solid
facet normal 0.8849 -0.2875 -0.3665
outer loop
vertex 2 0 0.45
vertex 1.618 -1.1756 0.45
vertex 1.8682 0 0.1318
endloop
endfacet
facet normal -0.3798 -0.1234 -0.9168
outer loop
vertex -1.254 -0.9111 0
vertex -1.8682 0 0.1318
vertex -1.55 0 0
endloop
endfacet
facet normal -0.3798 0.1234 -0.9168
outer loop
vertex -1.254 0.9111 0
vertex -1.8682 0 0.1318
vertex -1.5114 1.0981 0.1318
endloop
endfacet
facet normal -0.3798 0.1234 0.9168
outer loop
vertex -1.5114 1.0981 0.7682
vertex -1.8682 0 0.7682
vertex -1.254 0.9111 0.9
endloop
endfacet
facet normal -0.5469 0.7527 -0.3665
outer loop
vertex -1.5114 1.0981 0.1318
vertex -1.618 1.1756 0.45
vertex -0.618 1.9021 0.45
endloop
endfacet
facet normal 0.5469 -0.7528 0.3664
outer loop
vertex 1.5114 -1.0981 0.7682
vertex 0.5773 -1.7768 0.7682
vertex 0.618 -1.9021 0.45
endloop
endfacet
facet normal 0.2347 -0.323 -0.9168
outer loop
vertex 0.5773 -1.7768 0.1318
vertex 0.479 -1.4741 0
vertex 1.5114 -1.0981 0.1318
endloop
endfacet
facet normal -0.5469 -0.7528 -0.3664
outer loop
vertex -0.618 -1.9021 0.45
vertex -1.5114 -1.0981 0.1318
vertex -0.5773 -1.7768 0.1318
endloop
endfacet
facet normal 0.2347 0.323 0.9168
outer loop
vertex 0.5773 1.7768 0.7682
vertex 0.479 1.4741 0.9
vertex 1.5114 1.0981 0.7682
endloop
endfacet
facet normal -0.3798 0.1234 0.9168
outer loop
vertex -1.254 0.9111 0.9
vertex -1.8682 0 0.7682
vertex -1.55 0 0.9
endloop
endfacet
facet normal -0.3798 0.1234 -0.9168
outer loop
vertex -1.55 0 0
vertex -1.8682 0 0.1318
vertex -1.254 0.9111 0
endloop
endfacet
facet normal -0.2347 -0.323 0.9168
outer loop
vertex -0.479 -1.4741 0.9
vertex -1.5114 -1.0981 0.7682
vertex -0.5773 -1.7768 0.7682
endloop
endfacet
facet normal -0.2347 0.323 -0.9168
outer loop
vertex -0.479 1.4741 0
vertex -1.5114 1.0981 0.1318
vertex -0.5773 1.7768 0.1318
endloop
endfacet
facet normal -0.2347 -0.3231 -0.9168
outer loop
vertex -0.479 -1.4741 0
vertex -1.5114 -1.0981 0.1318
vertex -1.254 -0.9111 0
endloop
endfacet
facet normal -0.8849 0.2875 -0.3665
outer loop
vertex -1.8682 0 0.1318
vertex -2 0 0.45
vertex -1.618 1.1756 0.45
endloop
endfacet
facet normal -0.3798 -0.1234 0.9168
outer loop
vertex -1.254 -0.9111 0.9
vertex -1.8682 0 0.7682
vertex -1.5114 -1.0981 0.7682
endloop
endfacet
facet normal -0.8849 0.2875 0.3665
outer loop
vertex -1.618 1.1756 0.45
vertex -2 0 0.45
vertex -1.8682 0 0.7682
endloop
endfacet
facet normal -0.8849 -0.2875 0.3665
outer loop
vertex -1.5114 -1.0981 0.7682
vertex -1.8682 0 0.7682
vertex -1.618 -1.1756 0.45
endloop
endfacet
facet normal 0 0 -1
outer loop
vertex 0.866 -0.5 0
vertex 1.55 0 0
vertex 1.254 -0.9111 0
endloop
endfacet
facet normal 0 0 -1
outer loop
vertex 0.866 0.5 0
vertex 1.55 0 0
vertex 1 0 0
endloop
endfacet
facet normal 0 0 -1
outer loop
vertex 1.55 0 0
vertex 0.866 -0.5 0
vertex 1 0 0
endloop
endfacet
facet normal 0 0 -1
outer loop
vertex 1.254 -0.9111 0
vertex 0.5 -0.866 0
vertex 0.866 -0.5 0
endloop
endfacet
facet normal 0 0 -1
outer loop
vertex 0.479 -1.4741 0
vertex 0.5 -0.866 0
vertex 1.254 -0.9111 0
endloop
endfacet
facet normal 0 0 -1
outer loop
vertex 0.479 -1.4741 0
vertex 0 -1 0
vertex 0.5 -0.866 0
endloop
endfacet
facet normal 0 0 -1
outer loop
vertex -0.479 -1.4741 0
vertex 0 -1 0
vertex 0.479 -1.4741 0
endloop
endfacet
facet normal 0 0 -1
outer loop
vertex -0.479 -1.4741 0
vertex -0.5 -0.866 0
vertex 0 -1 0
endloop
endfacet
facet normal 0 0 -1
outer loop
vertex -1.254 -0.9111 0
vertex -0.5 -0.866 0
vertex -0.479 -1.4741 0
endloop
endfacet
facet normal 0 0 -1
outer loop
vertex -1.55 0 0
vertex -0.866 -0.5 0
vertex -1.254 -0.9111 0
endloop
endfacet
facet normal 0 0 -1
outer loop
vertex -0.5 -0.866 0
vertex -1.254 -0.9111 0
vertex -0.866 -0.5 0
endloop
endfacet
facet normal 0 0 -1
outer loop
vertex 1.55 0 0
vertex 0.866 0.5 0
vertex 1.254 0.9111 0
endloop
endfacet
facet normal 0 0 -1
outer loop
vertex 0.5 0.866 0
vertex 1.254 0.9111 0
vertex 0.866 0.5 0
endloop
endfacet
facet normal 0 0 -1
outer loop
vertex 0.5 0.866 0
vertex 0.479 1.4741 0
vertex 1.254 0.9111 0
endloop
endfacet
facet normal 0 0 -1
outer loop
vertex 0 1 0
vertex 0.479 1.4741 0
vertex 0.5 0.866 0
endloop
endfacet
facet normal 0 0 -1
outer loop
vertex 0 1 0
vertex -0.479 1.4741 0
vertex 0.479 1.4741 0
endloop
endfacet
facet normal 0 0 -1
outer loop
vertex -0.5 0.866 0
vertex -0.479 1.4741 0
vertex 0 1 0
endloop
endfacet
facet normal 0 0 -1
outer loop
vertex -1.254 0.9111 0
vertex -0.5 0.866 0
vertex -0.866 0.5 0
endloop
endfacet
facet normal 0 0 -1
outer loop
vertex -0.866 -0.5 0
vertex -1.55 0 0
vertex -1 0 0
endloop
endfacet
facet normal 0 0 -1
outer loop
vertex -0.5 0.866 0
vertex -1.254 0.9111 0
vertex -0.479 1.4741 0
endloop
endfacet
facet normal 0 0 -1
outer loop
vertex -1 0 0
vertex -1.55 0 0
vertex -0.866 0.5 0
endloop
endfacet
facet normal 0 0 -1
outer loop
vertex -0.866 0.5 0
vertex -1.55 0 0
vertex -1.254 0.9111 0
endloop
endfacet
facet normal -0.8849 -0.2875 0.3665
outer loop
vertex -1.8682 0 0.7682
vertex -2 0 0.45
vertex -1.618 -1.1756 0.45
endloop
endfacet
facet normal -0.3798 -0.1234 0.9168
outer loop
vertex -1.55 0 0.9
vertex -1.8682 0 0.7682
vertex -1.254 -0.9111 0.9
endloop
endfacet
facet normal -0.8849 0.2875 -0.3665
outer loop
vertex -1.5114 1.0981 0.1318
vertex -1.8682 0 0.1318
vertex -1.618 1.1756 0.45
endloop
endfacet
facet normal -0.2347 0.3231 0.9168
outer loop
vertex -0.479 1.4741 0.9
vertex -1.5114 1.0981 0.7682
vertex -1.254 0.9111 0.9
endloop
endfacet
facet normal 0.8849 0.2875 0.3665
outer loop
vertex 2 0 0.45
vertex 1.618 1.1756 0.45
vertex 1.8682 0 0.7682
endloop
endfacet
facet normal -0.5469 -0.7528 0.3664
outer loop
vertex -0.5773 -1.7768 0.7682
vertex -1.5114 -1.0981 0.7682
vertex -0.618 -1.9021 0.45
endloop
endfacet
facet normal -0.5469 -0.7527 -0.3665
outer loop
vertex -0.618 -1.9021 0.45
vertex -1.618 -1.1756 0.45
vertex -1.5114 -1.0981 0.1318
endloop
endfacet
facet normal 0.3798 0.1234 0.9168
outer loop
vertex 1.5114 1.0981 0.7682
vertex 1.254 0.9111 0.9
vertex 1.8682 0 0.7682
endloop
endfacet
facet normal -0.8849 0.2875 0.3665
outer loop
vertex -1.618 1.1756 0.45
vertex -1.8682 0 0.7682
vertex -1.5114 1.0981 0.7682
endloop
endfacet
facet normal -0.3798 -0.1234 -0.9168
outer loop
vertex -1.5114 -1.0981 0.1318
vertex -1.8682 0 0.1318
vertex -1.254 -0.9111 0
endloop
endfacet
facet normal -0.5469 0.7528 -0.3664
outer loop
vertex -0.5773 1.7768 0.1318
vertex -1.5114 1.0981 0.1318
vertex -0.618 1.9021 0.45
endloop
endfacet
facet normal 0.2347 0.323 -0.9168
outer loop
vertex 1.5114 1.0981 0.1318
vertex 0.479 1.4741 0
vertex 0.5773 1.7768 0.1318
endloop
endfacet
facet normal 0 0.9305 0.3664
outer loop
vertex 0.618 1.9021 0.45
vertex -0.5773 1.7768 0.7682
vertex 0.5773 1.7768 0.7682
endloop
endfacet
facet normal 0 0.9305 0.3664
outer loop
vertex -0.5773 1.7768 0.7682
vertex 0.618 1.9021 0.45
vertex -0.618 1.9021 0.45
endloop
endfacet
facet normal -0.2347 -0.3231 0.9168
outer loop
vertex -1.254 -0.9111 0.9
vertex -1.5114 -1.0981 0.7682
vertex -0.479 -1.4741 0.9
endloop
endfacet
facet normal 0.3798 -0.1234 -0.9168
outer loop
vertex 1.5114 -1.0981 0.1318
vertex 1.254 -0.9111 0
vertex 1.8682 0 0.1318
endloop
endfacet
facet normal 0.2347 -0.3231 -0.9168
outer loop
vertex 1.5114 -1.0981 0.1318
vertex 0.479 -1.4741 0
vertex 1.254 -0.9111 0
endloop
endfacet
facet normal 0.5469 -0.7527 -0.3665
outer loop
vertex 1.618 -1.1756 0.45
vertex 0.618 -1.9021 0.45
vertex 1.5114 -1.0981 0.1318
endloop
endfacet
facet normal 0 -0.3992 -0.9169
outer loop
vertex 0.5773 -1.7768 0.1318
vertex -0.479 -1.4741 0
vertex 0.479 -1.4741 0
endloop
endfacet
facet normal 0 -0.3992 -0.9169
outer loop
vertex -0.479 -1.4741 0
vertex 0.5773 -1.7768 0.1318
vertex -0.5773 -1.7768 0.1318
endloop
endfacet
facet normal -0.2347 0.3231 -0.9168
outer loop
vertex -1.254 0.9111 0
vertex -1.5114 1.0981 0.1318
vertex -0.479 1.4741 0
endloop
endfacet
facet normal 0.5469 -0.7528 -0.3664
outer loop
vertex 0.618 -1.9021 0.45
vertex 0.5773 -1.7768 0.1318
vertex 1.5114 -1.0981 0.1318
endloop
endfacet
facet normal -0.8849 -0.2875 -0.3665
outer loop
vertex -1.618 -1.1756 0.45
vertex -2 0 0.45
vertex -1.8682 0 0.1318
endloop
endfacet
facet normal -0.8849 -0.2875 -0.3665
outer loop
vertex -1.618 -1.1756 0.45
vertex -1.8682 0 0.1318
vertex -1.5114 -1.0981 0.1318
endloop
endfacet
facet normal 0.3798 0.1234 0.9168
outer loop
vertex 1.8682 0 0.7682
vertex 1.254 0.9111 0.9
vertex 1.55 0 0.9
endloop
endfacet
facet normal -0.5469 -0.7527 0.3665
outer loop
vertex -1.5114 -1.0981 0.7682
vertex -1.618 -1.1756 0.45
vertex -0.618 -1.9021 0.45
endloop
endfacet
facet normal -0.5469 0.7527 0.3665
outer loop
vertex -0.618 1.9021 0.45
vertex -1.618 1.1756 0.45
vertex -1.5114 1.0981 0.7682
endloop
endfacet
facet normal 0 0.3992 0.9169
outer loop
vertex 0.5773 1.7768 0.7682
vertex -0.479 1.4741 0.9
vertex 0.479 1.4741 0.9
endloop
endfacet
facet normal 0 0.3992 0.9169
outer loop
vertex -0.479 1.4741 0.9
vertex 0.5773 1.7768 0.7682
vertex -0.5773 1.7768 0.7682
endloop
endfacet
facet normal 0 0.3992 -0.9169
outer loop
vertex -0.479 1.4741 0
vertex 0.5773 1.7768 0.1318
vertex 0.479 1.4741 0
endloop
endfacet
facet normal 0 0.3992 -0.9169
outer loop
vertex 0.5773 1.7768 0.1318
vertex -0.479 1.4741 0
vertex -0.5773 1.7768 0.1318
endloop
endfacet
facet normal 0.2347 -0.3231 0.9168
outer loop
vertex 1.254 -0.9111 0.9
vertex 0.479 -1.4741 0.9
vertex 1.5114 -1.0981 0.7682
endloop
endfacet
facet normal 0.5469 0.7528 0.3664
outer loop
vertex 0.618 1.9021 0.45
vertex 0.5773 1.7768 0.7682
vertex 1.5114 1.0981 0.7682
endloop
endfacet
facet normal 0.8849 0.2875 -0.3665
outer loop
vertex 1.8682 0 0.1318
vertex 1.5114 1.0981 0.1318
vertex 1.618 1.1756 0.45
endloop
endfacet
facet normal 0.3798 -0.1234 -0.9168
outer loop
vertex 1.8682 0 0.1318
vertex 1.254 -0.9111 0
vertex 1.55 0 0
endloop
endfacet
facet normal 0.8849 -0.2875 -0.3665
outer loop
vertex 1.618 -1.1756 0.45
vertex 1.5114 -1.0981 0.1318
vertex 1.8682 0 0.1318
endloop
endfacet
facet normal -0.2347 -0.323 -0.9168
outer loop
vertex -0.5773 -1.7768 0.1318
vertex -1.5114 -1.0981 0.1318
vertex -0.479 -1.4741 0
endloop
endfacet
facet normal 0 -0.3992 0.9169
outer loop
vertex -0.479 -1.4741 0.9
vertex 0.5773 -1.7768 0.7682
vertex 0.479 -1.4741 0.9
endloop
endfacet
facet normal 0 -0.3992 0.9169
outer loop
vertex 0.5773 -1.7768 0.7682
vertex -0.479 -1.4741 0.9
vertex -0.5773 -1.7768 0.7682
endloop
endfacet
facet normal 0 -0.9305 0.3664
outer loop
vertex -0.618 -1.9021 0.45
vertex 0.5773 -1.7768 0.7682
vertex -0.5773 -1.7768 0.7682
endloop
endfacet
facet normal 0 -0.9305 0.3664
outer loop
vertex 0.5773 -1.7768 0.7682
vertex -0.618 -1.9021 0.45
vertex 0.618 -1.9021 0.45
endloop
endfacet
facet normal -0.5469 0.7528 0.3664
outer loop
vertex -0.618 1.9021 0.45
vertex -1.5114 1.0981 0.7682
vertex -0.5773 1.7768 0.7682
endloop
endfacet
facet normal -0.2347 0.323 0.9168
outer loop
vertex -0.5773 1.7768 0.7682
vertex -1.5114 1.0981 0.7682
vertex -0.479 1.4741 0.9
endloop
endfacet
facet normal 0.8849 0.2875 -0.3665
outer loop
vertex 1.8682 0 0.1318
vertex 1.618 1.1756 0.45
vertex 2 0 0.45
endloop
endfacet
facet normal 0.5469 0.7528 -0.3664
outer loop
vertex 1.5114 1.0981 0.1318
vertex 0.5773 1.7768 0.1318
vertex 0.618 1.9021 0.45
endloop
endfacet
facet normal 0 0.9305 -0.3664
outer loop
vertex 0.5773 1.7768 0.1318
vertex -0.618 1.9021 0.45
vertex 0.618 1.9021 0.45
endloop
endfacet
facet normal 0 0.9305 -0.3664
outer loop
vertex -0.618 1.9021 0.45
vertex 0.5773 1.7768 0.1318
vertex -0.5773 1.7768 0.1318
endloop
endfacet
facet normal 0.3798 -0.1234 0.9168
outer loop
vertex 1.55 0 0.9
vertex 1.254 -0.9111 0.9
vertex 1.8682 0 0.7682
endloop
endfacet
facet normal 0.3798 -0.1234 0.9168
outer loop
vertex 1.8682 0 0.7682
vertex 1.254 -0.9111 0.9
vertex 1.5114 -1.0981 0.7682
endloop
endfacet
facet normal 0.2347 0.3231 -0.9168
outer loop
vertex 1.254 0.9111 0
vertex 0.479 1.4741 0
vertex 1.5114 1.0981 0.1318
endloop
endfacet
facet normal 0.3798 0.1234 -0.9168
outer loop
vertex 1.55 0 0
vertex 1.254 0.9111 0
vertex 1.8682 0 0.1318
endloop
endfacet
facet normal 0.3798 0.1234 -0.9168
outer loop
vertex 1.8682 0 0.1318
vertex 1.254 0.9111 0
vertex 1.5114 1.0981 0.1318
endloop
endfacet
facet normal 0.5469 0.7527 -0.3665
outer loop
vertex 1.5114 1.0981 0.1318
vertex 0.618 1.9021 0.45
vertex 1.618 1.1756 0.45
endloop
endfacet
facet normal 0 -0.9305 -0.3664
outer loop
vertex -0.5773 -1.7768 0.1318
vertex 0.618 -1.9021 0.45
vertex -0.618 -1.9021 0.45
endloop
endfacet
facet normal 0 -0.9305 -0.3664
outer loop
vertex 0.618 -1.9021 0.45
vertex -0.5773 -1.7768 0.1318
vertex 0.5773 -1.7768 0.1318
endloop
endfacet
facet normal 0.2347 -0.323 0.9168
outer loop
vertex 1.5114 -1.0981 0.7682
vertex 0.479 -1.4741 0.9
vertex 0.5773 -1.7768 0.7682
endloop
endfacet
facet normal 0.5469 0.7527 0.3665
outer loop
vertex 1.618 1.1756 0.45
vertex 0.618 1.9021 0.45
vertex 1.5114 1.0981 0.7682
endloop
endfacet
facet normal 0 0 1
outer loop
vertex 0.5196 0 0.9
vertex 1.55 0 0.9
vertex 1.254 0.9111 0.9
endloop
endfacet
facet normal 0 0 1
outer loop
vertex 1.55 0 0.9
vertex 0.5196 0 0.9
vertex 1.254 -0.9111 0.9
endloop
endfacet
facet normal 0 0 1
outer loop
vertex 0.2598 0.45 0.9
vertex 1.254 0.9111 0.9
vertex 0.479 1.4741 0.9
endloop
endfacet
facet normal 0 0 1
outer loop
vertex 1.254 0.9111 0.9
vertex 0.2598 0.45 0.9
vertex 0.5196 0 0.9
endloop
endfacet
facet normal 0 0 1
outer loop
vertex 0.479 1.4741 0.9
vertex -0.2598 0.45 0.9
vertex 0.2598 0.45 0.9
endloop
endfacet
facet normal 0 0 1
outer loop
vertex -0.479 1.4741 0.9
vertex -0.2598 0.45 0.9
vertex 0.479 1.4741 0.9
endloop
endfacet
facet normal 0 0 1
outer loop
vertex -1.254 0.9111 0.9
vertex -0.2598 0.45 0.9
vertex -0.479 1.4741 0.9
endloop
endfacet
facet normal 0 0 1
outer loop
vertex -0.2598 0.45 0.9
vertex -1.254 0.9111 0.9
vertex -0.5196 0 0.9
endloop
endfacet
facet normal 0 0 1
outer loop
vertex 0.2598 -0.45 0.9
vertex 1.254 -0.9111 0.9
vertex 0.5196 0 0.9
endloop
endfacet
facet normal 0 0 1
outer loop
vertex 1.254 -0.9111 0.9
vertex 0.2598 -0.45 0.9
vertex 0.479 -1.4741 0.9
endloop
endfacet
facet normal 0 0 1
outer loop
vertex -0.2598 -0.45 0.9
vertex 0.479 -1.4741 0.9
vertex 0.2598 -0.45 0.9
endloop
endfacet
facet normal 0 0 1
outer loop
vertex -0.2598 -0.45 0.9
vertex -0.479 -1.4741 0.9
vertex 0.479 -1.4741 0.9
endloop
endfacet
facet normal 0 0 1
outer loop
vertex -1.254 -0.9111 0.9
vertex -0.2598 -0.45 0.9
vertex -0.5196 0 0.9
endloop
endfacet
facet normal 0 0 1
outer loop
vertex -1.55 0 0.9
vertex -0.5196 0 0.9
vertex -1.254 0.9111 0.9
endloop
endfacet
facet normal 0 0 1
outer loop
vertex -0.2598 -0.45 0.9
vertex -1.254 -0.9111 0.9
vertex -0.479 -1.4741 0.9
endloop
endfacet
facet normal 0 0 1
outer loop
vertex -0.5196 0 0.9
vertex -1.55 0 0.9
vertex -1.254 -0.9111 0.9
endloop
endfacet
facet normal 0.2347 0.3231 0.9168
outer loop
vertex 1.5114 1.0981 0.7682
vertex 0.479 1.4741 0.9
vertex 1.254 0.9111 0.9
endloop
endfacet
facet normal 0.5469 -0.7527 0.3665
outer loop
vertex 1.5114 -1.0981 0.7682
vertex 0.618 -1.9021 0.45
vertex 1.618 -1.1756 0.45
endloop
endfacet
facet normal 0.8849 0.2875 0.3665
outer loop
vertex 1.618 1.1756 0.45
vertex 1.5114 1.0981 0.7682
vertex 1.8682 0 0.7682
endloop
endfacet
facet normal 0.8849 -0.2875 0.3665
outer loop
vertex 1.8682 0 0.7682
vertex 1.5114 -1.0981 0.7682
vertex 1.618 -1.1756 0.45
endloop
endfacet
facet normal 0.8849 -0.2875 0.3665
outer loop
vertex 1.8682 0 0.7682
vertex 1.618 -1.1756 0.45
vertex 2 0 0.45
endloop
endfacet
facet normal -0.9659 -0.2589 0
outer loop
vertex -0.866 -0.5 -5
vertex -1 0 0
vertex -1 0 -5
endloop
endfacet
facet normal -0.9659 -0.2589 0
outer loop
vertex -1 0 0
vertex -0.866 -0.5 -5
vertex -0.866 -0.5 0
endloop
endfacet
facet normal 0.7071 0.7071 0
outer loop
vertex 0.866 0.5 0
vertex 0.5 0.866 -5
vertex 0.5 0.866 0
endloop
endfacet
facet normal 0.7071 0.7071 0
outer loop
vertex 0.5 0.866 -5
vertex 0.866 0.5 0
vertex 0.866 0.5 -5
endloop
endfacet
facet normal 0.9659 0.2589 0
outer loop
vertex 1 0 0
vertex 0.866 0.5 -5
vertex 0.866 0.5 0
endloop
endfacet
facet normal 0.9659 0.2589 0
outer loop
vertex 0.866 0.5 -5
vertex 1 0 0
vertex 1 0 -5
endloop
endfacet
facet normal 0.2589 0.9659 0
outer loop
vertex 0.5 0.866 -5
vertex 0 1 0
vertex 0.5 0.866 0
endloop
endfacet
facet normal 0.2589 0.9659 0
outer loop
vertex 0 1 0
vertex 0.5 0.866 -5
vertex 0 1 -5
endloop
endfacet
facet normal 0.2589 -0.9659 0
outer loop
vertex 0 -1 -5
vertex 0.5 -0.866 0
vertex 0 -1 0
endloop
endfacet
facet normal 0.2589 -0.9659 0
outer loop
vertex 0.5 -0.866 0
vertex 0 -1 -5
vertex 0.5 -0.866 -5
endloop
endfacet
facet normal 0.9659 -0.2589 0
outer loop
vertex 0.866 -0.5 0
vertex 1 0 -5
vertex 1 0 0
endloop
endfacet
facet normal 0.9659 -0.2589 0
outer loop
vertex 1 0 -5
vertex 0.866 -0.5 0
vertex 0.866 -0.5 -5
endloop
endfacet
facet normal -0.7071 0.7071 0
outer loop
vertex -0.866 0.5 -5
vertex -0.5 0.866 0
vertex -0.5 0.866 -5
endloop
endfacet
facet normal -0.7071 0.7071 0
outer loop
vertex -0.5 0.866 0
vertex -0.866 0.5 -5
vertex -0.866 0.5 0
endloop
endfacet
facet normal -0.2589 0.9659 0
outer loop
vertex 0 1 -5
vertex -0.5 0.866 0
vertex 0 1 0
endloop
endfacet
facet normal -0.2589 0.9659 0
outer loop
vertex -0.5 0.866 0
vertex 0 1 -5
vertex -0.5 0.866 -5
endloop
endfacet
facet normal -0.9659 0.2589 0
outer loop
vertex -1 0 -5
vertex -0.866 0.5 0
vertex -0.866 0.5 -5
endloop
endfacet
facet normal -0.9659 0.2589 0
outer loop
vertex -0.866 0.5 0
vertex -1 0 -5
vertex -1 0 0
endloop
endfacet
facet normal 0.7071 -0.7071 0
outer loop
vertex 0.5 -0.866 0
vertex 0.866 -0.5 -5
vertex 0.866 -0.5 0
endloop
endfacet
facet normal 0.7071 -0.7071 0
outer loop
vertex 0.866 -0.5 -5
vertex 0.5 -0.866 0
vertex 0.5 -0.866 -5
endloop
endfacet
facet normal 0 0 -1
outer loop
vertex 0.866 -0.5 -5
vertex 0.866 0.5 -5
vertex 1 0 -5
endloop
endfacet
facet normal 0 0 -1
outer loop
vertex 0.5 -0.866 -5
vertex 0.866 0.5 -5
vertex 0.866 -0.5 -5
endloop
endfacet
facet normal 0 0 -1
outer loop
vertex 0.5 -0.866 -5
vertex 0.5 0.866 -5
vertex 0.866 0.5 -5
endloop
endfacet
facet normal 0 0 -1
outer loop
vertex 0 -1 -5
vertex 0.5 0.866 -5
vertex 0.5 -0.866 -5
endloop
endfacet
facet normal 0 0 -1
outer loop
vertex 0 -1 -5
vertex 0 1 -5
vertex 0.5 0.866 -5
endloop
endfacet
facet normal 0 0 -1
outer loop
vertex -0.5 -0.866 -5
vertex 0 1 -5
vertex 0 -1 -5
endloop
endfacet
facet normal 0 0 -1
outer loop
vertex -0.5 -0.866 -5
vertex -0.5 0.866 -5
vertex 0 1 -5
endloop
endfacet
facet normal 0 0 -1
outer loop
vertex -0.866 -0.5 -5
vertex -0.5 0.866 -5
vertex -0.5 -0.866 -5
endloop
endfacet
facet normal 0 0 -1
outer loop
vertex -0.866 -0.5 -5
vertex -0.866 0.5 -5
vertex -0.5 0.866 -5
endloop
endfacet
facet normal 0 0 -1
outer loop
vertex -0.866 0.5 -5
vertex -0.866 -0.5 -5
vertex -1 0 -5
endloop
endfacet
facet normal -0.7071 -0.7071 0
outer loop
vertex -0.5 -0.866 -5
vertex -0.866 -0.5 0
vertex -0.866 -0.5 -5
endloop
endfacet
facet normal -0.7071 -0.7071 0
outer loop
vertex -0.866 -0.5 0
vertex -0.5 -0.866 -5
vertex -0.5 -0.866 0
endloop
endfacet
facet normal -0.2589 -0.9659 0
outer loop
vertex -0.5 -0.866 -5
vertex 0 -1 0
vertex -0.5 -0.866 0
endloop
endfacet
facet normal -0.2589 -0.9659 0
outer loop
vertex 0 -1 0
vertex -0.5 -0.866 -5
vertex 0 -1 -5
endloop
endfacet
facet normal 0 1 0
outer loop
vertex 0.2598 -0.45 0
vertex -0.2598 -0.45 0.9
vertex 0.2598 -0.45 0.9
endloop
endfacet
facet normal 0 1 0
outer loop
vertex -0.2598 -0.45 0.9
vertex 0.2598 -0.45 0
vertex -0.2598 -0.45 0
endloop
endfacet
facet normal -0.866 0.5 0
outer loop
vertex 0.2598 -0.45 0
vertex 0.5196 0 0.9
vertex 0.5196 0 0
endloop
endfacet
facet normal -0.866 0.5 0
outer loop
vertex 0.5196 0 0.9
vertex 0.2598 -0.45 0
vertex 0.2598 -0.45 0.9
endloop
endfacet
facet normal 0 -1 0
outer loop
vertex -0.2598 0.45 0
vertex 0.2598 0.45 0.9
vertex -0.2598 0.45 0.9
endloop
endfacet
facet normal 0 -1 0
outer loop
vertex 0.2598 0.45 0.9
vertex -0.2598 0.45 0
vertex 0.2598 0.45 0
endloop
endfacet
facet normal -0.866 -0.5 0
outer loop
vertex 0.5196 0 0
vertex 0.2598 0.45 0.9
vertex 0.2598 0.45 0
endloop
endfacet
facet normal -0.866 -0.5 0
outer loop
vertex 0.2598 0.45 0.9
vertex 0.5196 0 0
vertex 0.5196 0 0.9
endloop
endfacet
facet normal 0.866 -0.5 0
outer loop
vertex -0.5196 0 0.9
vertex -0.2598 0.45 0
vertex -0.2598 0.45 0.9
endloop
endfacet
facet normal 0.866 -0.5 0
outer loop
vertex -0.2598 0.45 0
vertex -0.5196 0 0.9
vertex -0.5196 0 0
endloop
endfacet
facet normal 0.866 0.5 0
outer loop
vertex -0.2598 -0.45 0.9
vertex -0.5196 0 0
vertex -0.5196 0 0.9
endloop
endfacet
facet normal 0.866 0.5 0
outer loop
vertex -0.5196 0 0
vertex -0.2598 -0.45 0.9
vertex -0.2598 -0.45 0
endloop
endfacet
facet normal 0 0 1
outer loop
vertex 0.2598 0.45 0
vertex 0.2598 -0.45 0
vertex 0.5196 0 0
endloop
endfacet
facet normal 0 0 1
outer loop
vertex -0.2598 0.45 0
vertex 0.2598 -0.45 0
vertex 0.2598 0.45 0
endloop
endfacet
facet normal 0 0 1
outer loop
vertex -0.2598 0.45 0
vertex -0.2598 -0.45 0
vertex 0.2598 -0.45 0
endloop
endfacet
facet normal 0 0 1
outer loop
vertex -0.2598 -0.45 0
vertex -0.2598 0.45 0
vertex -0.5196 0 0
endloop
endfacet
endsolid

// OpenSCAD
module screw(d, l, dk, k, s)
{
    difference(){

    union(){
    rotate_extrude(convexity=10, $fn=10)
    {
        square([dk/2-k/2,k]);
        translate([dk/2-k/2,k/2]) circle(k/2, $fn=8);
    }
    translate([0,0,-l])
    cylinder(l, d/2, d/2, $fn=12);
    }
    cylinder(l, s/2*sqrt(3)/2, s/2*sqrt(3)/2, $fn=6);
    }
}


screw(2, 5, 4, 0.9, 1.2);
